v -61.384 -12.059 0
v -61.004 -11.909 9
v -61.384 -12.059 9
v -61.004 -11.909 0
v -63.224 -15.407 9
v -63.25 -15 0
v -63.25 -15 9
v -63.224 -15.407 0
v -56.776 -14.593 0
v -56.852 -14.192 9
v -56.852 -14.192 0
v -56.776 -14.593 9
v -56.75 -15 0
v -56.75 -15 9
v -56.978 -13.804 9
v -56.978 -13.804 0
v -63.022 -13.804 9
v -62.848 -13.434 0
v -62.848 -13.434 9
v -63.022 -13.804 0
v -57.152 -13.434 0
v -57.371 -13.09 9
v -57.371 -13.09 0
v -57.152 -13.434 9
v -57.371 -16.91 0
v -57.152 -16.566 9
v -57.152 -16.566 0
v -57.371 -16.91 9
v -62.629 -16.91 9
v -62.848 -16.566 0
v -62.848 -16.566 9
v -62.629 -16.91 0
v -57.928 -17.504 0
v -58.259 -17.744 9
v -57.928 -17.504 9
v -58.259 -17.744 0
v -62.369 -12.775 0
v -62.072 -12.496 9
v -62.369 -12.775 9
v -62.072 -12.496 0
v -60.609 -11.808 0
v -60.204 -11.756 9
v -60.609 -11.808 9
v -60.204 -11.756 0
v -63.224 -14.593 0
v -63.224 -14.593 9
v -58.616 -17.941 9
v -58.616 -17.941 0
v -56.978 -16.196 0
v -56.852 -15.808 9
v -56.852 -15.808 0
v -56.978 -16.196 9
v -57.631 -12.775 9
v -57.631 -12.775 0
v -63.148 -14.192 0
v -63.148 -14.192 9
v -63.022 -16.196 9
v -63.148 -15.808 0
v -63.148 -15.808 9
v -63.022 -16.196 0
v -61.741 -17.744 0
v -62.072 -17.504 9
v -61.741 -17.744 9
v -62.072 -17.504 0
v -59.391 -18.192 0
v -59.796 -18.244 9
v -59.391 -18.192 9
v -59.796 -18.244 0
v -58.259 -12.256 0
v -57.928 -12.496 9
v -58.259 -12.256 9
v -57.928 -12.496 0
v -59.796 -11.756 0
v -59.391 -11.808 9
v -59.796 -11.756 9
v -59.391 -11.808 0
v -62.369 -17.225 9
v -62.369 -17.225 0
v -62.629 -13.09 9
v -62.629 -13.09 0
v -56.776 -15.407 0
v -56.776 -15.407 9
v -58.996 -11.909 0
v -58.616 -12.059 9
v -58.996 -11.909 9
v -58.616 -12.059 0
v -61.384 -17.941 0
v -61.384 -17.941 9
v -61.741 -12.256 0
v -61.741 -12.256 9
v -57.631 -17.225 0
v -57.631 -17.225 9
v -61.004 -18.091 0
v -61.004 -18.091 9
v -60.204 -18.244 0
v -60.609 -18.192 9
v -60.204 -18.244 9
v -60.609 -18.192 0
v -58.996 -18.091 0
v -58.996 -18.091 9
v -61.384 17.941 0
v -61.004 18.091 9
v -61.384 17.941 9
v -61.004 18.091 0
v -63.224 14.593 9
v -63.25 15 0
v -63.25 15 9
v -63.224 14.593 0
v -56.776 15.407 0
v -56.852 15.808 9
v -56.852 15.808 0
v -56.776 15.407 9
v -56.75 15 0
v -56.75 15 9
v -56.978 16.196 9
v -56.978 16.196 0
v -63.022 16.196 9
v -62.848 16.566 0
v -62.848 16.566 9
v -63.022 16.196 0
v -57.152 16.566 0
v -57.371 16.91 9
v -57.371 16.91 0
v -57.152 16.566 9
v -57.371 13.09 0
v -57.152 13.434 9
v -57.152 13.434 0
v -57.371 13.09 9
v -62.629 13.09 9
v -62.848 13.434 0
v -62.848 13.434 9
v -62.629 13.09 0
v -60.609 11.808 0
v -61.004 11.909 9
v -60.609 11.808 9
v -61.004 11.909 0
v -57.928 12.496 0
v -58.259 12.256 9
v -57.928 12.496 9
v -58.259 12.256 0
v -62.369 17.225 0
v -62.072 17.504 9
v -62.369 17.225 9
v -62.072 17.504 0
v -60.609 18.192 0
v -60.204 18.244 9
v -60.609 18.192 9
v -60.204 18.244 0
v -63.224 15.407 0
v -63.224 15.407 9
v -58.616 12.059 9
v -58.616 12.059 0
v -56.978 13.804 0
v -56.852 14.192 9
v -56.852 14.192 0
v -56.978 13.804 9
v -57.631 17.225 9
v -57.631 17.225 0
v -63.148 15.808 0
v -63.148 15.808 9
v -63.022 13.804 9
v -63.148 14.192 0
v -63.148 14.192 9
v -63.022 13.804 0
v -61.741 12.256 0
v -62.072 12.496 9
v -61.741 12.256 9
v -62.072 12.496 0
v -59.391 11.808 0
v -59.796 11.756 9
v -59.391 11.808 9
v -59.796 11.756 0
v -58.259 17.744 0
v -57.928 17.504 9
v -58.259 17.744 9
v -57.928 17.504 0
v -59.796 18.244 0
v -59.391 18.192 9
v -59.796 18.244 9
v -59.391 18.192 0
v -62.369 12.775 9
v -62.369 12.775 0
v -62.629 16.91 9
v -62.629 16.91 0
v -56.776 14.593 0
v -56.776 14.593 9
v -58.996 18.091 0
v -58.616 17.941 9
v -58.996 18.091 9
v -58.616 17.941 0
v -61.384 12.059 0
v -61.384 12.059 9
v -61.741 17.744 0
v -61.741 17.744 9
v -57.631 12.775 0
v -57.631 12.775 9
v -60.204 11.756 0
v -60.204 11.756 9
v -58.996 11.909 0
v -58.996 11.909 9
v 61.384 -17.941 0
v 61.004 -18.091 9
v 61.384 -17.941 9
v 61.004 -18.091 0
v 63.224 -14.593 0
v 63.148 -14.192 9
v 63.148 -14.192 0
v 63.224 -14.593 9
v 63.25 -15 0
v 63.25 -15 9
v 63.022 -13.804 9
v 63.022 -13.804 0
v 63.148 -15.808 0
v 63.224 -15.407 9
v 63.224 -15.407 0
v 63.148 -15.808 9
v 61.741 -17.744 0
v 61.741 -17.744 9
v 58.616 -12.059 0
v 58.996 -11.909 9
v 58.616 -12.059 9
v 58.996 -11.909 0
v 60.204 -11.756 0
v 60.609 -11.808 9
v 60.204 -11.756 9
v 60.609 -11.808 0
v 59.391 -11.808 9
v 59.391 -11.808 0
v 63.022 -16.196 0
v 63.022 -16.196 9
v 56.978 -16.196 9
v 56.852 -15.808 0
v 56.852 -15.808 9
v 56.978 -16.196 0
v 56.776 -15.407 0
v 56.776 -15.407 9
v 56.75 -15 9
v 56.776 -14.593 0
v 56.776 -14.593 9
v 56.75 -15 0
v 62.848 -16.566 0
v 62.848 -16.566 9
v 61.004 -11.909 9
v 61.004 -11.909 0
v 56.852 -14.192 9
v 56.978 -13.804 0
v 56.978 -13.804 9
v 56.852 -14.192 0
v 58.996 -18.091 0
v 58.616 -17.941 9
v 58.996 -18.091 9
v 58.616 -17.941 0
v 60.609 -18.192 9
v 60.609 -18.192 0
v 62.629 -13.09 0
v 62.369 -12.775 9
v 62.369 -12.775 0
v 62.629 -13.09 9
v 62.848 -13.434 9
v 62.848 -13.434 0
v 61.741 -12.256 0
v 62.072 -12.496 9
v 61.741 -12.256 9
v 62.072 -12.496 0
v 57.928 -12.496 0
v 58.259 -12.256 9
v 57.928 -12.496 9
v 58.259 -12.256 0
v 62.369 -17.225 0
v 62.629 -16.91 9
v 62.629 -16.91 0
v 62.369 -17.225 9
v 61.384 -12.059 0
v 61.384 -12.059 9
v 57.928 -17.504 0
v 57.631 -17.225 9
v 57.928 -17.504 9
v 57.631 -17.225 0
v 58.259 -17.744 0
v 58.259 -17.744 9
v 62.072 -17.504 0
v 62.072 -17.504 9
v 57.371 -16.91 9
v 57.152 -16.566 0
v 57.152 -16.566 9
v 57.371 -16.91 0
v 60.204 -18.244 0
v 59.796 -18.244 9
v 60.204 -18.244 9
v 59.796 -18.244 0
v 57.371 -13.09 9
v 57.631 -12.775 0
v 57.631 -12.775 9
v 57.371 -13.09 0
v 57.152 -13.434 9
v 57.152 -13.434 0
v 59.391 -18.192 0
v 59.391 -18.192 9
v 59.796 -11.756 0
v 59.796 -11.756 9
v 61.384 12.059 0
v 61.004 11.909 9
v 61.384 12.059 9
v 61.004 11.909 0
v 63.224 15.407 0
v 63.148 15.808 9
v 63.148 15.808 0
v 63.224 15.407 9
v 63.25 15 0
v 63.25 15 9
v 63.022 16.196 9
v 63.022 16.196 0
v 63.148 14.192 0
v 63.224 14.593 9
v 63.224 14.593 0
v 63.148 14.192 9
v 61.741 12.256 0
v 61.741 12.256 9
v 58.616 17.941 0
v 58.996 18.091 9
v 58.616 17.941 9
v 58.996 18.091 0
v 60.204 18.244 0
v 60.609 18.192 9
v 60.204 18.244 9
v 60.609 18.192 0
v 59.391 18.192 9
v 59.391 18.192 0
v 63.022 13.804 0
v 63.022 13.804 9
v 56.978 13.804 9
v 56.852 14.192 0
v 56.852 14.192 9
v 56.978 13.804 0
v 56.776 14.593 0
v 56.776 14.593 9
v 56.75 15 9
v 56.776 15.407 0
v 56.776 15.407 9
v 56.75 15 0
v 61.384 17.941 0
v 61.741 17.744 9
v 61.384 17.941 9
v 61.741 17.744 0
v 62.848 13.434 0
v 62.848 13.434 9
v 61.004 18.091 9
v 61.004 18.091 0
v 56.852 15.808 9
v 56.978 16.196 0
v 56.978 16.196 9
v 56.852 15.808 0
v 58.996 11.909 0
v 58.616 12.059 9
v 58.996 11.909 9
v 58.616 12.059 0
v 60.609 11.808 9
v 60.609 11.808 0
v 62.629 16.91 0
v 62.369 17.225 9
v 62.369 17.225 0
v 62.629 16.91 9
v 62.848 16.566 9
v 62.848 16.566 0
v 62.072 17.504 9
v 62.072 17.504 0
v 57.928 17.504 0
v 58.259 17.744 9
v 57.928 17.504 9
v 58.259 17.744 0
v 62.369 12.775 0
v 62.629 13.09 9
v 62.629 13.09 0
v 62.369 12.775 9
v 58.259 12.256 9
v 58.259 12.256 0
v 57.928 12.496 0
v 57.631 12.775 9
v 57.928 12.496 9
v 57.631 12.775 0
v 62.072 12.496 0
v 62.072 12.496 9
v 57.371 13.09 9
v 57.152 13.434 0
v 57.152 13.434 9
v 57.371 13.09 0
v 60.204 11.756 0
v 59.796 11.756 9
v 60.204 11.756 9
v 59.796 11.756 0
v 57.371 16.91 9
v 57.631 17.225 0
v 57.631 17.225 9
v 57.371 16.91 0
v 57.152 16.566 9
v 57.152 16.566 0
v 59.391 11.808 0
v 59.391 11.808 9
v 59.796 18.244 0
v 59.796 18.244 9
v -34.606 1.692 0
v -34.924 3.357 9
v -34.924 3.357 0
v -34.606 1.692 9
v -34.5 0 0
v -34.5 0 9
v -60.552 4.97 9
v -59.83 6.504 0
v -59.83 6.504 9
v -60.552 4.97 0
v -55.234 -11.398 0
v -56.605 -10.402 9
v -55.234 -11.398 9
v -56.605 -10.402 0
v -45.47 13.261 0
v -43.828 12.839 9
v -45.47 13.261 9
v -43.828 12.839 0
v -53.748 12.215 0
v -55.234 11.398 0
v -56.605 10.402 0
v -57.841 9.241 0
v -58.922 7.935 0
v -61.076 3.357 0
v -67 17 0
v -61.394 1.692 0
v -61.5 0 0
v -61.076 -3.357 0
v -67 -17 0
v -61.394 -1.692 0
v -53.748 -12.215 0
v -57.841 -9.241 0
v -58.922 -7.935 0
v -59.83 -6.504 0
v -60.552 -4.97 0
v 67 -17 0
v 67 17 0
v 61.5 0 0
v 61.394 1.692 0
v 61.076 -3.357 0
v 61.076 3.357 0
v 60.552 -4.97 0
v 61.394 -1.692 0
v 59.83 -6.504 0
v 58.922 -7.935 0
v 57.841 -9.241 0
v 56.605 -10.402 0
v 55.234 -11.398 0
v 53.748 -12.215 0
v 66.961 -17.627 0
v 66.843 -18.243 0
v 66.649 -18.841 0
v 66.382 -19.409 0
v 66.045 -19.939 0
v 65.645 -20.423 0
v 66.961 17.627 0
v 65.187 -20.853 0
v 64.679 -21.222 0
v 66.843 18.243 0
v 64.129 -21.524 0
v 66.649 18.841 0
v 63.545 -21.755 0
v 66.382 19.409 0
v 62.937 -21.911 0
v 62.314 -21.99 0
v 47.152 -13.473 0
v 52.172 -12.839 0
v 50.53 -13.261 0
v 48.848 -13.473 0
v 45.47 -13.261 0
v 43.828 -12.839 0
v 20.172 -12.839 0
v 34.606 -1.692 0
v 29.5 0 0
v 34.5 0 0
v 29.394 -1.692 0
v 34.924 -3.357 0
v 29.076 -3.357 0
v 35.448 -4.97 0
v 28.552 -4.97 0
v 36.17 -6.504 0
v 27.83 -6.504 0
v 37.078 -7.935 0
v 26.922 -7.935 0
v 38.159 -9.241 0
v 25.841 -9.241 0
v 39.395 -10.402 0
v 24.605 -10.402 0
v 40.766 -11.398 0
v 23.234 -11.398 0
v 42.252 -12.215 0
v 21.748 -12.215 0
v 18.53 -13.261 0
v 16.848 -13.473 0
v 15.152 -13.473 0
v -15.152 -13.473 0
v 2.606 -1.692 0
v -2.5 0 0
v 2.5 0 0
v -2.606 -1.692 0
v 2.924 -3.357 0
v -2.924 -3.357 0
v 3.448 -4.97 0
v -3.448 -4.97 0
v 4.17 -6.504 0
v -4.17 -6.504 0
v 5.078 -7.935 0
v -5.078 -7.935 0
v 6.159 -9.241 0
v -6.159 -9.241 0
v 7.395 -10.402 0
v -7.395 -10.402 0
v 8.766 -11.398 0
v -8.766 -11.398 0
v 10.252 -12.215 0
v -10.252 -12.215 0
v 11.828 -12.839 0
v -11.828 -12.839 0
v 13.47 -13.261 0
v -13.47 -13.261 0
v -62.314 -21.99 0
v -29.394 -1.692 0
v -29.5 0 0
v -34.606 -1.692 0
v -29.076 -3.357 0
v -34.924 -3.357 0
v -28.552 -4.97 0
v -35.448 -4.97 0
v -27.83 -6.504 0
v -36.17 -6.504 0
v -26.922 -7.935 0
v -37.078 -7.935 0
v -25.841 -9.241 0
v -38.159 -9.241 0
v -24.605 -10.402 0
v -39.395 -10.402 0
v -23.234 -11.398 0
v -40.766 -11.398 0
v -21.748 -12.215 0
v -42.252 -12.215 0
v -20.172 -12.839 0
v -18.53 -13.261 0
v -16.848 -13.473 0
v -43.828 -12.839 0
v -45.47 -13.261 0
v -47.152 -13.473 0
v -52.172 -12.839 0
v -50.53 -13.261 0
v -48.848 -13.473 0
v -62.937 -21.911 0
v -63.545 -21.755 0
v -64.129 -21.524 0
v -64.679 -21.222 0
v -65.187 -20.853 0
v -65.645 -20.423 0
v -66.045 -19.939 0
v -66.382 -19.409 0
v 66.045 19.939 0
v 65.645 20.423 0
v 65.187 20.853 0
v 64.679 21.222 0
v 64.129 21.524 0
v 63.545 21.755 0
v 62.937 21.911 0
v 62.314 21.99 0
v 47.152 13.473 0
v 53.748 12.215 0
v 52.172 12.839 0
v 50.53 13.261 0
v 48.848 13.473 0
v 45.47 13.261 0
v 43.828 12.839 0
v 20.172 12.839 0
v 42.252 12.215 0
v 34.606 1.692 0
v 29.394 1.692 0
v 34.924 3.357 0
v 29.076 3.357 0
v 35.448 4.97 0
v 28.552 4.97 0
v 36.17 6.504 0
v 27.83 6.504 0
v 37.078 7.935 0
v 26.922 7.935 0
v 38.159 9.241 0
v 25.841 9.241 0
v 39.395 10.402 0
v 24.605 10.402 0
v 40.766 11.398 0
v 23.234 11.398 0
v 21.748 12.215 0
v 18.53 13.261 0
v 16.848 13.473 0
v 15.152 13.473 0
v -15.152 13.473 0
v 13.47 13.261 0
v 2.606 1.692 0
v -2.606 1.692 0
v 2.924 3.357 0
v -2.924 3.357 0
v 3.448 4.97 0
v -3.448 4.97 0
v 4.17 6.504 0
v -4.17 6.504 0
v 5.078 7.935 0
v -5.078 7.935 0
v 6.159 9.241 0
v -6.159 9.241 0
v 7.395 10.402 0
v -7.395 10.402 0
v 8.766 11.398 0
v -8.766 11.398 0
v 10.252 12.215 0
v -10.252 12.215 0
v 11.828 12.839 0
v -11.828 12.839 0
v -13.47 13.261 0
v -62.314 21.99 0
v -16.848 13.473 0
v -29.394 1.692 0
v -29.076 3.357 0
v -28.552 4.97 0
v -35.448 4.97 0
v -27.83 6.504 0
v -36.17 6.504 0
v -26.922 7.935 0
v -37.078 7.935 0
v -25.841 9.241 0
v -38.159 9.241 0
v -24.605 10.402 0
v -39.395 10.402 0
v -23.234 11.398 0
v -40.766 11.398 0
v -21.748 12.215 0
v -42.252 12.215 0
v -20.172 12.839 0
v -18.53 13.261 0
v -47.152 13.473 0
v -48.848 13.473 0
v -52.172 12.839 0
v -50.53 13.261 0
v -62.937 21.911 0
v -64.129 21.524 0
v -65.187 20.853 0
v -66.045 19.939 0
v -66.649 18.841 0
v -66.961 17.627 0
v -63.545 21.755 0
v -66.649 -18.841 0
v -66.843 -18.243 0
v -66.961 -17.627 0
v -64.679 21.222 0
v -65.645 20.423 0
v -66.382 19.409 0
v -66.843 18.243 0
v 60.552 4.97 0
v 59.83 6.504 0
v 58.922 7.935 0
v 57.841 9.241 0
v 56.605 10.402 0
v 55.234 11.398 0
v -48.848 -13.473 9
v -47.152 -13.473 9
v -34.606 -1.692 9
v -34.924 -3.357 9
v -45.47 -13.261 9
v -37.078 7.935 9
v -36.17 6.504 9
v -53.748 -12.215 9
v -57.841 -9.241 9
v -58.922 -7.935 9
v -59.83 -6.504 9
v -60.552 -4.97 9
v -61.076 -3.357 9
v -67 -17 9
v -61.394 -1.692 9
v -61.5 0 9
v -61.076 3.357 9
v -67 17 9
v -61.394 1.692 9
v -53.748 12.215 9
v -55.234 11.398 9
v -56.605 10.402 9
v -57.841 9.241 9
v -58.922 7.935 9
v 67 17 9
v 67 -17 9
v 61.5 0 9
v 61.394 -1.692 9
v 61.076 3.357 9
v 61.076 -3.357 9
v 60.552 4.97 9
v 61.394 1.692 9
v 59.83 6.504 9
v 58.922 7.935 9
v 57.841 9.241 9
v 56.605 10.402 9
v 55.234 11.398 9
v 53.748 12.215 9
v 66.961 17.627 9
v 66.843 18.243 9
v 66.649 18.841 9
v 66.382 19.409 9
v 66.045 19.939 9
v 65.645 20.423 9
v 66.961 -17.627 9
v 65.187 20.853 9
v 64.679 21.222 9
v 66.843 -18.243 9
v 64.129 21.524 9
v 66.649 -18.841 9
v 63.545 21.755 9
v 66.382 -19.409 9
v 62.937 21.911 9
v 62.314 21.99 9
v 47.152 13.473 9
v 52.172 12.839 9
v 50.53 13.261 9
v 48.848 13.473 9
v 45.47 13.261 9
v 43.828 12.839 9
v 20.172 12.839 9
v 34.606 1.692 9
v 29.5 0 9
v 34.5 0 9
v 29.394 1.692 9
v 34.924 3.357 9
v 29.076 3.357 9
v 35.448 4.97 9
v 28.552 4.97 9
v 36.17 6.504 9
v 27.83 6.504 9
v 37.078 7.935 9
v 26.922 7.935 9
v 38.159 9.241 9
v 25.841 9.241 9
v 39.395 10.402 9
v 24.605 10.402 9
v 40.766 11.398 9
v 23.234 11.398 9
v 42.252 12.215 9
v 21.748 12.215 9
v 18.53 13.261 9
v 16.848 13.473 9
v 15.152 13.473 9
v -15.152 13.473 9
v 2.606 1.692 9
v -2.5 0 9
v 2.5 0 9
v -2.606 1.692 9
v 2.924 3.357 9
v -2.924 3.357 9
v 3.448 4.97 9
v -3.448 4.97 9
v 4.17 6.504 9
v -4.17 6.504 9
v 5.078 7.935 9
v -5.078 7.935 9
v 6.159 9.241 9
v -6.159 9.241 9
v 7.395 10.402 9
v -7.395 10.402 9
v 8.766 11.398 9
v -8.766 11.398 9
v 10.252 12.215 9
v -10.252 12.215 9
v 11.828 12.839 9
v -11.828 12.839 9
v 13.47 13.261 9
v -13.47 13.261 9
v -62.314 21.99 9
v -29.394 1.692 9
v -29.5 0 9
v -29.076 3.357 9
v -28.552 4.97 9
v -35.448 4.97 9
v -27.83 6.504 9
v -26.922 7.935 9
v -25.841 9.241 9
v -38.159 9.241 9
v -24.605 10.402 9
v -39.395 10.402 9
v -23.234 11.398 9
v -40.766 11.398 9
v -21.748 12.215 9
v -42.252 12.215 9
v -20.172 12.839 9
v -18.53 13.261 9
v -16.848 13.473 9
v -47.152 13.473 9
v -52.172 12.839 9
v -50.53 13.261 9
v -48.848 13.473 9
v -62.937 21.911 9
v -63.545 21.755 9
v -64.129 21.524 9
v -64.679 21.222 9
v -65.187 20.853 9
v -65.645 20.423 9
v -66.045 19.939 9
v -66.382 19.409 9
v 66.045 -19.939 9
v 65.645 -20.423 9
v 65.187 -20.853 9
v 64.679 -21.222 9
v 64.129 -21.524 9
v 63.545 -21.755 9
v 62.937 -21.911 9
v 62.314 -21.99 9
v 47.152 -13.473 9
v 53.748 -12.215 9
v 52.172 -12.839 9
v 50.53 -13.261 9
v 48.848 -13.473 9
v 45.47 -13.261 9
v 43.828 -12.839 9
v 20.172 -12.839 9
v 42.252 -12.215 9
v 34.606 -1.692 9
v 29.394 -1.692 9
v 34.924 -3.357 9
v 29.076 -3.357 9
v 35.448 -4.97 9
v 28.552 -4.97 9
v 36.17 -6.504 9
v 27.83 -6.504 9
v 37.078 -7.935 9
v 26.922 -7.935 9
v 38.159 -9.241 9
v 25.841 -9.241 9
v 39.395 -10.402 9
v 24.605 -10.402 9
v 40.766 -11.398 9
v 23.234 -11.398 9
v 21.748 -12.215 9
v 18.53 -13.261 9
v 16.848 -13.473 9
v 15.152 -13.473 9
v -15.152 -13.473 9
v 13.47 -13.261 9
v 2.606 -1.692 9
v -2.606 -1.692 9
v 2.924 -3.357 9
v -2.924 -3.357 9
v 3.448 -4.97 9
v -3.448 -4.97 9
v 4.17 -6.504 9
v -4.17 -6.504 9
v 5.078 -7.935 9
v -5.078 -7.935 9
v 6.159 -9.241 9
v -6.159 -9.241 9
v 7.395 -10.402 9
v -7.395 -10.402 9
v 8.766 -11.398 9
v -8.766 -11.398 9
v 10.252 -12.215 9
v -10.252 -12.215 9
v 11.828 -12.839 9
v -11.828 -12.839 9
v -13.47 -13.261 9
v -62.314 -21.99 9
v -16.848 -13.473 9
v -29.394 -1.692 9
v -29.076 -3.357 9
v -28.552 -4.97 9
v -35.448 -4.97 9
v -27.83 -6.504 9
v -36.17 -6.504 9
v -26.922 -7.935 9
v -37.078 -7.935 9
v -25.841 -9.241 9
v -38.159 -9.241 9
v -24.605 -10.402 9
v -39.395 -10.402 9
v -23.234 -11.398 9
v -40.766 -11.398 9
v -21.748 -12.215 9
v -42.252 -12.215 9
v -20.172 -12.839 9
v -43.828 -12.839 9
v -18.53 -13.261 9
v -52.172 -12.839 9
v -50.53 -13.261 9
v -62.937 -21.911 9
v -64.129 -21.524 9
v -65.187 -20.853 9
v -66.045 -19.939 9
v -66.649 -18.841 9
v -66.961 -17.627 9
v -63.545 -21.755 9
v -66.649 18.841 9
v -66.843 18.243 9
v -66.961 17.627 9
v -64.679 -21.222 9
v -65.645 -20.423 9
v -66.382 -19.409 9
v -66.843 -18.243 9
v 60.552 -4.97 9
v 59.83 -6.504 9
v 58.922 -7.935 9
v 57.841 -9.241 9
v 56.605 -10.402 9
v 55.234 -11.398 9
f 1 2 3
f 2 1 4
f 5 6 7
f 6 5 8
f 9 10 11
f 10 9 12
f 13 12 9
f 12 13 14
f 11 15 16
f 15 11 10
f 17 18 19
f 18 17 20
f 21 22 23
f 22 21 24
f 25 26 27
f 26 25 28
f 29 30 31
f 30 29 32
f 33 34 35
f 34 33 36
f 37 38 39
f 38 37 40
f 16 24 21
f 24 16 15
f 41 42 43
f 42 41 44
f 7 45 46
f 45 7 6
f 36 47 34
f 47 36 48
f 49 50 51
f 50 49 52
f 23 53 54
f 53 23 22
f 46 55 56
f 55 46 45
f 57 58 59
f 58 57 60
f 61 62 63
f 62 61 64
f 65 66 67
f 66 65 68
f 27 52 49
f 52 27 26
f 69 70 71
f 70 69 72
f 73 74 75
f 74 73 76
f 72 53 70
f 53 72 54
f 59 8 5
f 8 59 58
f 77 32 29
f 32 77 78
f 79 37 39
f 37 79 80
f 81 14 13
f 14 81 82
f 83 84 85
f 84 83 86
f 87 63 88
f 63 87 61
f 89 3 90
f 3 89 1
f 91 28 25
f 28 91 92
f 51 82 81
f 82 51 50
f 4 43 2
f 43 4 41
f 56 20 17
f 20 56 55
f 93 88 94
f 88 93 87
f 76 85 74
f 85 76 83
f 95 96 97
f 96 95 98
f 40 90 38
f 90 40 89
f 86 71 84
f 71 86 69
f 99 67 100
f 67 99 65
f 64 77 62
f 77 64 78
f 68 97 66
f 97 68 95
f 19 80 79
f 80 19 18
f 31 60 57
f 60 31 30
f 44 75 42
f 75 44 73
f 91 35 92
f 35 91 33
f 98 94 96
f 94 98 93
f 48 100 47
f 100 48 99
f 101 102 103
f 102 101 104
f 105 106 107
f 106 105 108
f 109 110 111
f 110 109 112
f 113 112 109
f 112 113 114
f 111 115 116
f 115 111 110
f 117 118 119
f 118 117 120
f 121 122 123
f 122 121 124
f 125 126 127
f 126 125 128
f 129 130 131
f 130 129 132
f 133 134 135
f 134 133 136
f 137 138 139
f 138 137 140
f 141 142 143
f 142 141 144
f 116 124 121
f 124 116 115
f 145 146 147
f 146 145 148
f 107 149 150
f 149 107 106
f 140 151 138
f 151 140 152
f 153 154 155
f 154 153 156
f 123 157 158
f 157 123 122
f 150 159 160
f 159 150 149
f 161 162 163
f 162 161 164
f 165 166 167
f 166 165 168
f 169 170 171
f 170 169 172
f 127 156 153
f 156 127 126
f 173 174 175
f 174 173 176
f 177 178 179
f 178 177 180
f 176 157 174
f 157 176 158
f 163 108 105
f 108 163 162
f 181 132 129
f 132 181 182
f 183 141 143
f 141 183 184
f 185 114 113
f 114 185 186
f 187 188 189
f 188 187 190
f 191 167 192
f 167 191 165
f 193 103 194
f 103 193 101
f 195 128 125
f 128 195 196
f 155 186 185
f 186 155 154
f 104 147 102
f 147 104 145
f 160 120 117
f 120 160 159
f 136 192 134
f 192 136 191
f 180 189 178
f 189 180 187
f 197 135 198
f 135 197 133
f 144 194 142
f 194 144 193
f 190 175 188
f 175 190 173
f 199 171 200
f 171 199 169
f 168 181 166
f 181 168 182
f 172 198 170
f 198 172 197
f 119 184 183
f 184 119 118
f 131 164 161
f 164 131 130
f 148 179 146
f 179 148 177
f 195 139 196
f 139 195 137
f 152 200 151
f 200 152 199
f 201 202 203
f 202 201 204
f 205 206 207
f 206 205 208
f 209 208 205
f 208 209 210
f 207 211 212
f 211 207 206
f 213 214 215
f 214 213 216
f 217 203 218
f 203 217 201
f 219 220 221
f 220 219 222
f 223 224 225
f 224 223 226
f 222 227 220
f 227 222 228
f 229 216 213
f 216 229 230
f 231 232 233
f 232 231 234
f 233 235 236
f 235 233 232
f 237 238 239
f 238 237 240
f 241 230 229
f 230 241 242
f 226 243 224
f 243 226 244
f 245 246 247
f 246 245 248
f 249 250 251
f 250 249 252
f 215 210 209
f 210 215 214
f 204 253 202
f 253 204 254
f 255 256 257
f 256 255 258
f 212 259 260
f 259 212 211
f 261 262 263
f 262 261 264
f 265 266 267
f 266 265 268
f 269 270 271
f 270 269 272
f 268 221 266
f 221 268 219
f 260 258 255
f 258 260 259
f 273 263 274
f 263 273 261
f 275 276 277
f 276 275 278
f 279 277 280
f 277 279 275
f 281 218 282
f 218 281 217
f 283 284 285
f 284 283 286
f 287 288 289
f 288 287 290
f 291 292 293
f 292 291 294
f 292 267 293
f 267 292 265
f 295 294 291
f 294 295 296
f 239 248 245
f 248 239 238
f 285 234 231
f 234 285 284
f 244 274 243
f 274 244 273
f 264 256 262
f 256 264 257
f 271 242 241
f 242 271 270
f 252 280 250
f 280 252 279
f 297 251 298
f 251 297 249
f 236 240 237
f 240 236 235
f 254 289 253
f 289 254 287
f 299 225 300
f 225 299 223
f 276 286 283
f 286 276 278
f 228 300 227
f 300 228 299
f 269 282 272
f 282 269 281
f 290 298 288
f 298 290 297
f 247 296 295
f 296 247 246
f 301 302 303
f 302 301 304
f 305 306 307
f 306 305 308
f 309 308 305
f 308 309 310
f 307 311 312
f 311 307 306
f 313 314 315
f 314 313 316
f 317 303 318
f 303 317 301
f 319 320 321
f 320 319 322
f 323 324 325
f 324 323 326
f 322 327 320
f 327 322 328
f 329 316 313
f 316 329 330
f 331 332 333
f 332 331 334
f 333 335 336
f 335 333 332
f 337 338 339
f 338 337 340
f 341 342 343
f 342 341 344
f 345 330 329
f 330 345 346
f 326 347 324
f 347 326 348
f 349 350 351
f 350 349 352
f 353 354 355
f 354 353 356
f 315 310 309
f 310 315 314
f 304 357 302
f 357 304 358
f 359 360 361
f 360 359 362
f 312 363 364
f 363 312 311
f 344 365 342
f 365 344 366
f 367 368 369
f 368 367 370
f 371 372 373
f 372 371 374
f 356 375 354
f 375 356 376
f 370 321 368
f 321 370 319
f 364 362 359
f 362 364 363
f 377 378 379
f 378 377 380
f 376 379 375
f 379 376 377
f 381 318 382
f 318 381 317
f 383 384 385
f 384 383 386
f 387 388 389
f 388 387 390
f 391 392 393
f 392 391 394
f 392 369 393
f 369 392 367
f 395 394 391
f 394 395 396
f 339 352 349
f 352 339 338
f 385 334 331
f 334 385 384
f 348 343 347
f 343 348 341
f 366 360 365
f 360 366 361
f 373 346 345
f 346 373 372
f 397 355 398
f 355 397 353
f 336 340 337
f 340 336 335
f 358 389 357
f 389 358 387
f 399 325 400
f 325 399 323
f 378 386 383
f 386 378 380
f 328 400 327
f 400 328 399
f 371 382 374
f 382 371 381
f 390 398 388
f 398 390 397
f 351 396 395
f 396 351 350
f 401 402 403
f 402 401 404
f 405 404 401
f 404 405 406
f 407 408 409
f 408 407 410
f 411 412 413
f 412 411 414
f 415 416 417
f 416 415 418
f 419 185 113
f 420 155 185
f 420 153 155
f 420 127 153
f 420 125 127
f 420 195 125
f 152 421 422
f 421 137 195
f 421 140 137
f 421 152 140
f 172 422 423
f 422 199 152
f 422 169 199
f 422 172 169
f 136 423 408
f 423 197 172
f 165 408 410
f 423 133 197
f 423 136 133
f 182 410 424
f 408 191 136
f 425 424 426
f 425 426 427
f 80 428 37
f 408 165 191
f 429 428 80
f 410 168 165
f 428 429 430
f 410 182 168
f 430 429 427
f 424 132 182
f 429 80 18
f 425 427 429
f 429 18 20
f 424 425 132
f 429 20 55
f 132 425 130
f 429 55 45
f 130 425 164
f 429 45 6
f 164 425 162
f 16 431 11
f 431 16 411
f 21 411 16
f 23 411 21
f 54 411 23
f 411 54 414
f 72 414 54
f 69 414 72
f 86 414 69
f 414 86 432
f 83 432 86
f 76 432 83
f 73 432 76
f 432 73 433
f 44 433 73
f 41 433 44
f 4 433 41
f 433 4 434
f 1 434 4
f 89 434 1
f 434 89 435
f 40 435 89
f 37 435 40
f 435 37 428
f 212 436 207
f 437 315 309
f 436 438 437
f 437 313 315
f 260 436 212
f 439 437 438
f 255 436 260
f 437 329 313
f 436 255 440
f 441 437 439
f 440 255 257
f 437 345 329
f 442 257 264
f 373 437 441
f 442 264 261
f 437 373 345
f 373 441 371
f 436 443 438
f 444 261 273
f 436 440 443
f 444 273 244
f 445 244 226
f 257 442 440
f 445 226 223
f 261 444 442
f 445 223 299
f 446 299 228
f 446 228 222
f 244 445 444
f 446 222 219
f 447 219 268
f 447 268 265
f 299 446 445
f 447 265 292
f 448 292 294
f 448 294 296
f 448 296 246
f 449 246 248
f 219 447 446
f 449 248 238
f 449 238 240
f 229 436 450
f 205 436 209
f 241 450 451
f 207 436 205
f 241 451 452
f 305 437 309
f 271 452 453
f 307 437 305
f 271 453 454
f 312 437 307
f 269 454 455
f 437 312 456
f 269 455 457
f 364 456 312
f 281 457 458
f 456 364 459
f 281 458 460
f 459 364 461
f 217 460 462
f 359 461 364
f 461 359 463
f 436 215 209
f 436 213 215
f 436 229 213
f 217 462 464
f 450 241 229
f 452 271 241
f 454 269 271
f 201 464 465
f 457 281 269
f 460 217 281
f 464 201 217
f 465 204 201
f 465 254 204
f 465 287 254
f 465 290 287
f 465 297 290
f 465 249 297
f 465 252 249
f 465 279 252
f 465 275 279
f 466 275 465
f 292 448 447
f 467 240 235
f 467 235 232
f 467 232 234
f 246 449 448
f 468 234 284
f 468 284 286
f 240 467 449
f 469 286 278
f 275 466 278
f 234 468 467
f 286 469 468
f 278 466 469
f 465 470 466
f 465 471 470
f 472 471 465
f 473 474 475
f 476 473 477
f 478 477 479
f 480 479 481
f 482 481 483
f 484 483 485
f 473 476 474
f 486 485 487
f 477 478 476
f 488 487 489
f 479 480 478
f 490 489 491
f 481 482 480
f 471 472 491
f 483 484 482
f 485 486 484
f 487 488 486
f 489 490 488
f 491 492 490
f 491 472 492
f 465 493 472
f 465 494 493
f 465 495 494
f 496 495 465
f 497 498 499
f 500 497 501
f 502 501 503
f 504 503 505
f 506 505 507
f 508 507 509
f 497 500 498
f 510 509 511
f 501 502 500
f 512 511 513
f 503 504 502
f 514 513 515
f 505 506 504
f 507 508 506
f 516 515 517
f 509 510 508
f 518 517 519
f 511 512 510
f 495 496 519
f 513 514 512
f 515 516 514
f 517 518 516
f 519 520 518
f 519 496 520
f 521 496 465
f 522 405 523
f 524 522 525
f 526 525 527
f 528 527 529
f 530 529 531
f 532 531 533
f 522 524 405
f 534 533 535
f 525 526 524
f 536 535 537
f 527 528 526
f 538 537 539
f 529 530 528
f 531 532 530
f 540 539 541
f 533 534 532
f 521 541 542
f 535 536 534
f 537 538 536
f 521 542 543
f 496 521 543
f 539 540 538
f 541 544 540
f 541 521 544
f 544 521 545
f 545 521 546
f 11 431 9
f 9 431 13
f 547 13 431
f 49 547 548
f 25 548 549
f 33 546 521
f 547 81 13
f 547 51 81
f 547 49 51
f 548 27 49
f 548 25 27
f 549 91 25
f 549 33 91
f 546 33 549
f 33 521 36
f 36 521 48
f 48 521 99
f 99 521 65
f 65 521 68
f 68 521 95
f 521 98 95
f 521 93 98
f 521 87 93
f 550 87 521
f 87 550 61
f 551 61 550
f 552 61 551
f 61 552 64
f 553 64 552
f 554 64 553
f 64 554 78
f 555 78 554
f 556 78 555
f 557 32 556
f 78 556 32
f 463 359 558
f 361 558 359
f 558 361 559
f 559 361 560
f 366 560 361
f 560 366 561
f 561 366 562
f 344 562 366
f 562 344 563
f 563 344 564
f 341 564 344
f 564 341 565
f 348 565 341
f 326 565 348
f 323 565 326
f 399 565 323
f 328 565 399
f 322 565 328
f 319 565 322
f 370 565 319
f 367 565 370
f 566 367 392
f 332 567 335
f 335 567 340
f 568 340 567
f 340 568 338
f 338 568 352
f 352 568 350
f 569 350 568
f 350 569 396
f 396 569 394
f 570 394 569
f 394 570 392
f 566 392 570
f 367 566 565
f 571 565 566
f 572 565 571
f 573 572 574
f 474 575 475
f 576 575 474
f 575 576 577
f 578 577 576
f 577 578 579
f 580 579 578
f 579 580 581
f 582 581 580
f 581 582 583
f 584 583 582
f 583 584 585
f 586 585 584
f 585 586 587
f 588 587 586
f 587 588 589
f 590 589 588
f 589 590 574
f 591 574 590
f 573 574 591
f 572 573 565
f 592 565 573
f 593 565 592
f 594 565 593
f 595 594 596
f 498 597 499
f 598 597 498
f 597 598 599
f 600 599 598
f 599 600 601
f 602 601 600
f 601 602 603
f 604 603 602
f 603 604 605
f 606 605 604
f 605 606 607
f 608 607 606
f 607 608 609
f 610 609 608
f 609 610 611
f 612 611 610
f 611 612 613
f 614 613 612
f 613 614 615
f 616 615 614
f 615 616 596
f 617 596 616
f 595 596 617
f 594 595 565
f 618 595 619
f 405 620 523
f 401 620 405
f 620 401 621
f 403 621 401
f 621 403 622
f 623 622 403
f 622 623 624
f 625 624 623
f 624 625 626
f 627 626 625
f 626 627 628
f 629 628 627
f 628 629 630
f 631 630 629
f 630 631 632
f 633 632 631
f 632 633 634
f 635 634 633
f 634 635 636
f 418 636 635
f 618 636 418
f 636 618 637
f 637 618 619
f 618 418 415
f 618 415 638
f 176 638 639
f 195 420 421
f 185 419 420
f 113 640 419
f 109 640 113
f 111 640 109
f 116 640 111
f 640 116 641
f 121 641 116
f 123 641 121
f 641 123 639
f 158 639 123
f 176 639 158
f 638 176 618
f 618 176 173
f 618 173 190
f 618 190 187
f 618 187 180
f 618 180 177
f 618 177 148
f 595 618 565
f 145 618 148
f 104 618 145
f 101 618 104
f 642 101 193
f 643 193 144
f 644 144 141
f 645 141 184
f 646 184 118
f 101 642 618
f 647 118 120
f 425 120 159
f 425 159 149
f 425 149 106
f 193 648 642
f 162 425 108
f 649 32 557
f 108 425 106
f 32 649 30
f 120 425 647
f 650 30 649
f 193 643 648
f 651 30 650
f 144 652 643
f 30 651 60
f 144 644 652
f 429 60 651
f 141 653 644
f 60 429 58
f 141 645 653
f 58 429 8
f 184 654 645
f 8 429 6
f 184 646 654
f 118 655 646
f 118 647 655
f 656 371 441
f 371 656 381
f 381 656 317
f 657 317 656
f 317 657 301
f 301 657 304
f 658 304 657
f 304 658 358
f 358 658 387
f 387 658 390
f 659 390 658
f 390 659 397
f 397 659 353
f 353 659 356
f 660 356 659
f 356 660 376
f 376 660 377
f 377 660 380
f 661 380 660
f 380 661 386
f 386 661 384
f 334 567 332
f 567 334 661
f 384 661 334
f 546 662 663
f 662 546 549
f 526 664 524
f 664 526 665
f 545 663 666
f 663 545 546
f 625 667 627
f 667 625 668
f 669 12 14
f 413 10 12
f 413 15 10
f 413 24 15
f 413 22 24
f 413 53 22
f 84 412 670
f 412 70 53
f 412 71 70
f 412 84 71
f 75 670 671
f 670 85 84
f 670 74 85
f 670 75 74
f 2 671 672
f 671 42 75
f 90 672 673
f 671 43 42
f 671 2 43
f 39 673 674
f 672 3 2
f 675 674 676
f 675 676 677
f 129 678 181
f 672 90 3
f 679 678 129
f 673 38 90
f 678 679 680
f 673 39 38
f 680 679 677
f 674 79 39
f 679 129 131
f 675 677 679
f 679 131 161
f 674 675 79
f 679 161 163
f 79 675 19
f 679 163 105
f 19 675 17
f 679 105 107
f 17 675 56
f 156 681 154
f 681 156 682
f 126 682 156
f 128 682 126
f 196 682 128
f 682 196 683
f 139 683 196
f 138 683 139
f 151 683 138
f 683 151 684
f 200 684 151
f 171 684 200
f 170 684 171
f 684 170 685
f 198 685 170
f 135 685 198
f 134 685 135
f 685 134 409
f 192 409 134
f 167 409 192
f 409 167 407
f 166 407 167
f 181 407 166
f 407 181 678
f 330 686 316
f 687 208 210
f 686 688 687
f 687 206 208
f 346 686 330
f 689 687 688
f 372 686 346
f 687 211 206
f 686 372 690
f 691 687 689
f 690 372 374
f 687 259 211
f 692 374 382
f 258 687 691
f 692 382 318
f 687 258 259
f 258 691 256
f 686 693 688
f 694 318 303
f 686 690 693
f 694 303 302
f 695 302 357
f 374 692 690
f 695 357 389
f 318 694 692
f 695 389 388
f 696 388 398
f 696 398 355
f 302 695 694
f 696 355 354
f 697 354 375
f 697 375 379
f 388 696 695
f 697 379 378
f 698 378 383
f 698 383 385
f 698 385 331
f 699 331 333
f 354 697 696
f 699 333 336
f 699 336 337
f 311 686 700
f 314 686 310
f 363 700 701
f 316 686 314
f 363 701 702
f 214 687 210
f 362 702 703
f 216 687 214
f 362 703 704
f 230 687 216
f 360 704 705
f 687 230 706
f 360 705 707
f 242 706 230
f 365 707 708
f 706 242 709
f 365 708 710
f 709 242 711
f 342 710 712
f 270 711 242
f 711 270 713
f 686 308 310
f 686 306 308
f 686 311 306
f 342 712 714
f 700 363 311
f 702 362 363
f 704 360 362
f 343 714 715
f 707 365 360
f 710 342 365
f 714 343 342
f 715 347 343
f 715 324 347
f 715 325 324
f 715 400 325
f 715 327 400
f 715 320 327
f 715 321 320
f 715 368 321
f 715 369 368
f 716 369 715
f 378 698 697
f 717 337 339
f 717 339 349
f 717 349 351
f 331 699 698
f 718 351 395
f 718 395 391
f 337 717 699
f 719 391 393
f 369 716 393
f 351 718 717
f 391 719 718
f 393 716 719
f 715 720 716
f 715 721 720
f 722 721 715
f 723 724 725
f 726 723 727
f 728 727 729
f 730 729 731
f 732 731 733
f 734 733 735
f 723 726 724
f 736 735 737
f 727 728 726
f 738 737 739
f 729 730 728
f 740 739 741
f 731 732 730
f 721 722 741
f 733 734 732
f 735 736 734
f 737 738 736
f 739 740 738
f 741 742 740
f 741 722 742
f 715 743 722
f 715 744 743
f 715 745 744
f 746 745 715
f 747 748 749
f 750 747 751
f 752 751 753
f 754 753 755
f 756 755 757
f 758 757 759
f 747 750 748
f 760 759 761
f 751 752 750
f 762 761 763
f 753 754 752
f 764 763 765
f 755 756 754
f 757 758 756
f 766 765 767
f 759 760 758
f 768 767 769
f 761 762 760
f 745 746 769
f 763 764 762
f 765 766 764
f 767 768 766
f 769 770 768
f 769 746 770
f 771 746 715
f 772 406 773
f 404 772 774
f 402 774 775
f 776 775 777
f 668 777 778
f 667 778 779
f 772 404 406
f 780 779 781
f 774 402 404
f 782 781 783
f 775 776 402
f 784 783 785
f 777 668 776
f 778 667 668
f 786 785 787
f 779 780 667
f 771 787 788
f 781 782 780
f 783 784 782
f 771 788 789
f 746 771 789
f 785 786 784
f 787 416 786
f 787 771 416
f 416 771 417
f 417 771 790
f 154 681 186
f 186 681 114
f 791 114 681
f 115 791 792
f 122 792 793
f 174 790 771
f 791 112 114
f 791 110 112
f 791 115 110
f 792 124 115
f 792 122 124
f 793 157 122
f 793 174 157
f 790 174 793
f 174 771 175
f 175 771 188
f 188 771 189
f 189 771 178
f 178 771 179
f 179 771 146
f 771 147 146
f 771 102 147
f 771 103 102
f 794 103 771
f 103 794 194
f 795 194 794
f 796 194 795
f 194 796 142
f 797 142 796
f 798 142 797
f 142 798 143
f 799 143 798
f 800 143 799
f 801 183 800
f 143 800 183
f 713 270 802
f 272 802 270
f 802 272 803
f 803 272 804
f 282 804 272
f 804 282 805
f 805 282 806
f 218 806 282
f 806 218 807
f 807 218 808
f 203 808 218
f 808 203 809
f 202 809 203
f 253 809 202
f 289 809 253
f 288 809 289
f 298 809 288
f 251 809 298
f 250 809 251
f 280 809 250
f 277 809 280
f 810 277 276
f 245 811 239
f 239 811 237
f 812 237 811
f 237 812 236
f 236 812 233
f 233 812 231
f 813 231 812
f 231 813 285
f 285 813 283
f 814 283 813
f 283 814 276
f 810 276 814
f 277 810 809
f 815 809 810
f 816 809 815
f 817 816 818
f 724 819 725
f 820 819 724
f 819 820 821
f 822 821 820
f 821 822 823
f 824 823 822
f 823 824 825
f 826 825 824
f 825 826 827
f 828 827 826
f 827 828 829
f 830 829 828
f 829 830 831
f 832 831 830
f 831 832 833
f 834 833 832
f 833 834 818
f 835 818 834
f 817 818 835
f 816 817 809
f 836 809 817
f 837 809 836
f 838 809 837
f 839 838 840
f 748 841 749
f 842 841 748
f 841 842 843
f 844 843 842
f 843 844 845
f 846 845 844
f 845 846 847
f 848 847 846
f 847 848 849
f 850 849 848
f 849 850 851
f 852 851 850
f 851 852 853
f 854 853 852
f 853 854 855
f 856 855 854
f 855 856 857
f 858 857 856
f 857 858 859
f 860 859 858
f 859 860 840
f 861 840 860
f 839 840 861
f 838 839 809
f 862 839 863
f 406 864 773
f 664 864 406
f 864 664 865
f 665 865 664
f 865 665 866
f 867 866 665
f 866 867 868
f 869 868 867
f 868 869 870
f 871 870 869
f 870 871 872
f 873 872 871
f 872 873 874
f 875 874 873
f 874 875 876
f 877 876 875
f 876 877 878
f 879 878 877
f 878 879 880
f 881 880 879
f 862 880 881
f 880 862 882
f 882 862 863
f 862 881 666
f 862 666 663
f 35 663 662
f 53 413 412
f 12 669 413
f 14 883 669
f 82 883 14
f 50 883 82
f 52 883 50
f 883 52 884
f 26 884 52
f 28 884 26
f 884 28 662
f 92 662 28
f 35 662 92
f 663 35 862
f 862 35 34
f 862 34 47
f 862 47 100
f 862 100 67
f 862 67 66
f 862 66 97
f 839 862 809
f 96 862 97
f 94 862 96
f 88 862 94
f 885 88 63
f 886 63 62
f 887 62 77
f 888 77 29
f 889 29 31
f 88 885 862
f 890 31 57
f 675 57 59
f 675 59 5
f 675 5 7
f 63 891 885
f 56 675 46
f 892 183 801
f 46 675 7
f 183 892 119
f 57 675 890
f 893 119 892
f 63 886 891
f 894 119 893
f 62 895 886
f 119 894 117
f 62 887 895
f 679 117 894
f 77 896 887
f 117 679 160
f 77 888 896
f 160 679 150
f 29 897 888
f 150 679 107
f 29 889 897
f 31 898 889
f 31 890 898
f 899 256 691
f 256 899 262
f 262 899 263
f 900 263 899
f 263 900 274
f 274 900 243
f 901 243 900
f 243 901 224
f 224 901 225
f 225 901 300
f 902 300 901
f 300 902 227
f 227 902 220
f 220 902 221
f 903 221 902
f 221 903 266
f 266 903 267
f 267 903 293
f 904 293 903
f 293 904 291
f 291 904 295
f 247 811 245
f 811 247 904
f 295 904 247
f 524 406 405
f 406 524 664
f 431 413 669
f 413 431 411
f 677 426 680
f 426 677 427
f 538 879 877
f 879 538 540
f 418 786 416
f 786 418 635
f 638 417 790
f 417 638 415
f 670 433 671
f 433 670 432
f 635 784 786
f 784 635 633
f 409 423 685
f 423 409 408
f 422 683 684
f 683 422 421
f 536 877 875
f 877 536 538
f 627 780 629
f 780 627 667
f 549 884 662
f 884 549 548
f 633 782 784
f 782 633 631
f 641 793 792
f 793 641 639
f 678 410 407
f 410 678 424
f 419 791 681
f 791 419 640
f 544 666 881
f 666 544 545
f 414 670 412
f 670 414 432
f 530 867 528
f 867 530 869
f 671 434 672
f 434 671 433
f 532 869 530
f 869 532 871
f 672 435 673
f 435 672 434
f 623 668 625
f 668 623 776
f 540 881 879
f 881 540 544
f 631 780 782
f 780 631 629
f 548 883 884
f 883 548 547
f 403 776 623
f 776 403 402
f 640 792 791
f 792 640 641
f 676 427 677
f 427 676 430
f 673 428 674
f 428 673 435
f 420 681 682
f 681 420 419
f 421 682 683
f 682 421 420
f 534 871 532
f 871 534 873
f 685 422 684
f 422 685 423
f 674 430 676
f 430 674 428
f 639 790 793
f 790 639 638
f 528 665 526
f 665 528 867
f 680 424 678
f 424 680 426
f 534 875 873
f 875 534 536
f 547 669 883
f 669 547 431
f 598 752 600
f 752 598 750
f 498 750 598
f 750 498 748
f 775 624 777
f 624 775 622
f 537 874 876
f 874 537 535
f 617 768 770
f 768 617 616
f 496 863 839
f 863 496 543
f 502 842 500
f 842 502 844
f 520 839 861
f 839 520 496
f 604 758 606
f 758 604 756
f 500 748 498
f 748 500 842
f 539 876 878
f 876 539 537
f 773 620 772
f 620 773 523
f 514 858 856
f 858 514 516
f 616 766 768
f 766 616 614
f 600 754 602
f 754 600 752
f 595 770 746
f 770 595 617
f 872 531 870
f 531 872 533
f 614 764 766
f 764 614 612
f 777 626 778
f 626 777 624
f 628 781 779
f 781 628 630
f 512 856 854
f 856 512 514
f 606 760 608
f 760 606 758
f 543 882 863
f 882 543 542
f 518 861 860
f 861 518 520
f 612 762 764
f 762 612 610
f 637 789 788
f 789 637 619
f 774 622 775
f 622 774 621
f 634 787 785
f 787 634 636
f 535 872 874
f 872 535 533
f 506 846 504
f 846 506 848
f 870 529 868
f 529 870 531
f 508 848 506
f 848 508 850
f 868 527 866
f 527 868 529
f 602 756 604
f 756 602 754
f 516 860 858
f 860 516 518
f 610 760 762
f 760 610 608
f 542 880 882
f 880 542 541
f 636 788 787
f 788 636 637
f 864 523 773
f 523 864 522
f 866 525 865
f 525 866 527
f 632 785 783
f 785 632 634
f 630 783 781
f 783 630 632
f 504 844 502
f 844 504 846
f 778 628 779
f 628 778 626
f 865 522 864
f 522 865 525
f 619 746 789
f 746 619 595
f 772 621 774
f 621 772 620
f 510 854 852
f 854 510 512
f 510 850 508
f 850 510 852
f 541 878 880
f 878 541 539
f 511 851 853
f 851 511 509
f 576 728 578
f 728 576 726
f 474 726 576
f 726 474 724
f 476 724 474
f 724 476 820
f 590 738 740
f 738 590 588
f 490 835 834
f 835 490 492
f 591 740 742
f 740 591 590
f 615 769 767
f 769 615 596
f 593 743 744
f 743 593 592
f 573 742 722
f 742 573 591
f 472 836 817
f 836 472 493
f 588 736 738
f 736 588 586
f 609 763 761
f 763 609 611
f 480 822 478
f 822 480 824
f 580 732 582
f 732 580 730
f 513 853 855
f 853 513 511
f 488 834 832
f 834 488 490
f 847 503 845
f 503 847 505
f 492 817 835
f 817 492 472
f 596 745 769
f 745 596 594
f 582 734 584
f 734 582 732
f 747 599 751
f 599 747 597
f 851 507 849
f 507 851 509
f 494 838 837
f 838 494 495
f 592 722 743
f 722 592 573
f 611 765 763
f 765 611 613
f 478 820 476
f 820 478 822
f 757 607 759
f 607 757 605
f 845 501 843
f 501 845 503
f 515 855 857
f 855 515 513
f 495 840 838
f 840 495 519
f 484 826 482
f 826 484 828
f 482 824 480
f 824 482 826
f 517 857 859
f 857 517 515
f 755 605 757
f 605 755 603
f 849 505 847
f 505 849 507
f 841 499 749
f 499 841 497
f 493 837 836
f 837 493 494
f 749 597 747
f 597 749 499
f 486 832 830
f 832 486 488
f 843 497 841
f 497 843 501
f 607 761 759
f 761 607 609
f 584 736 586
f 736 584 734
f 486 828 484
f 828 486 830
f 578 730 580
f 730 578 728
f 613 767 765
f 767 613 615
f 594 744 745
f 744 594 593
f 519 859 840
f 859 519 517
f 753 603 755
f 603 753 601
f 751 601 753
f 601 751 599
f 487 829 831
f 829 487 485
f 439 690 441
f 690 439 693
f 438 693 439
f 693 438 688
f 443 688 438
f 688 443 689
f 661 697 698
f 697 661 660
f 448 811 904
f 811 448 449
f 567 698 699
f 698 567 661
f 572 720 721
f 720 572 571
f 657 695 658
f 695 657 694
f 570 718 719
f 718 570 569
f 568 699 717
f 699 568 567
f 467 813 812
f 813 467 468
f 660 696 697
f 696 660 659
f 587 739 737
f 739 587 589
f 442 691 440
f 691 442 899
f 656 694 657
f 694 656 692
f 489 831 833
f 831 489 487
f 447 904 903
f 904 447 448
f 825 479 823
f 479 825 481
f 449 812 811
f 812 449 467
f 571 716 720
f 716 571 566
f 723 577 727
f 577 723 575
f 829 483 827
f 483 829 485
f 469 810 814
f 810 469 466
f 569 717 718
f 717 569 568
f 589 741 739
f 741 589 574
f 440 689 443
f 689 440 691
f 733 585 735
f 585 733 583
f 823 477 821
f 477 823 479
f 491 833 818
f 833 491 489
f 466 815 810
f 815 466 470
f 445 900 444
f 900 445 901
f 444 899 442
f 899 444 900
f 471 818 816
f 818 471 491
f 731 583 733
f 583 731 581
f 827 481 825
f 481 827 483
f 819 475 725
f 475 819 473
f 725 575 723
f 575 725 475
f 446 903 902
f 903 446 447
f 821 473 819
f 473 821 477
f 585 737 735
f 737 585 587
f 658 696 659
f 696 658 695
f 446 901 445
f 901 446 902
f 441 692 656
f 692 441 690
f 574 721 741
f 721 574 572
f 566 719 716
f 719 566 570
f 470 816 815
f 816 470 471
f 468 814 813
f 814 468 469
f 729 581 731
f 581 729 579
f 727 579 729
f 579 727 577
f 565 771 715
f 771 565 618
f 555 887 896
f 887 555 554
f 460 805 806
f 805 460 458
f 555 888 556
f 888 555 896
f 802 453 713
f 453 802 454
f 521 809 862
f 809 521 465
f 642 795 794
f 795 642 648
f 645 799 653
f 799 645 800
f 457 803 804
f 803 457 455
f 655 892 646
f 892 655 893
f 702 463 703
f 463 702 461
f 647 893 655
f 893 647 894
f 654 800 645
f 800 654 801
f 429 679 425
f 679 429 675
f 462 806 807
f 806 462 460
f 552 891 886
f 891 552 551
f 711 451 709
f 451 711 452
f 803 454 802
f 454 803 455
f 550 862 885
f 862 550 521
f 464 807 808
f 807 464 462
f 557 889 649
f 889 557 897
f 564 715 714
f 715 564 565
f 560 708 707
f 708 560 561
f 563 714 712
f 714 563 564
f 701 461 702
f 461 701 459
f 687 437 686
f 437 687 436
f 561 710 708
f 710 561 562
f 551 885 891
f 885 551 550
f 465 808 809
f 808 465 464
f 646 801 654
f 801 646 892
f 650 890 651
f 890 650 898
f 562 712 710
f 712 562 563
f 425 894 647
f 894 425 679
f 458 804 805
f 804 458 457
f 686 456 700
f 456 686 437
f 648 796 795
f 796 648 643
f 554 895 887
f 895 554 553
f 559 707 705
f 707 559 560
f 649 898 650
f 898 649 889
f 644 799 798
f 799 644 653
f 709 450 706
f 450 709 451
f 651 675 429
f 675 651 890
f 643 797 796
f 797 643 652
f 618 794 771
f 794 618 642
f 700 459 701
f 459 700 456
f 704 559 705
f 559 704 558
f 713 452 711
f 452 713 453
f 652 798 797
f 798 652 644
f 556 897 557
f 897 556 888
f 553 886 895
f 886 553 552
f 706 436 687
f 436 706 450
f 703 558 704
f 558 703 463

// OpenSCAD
$fn = 50;

difference() {
	union() {
		hull() {
			translate(v = [-62.0, 17.0, 0]) {
				cylinder(h = 9, r = 5);
			}
			translate(v = [62.0, 17.0, 0]) {
				cylinder(h = 9, r = 5);
			}
			translate(v = [-62.0, -17.0, 0]) {
				cylinder(h = 9, r = 5);
			}
			translate(v = [62.0, -17.0, 0]) {
				cylinder(h = 9, r = 5);
			}
		}
	}
	union() {
		translate(v = [-60.0, -15.0, -100.0]) {
			cylinder(h = 200, r = 3.25);
		}
		translate(v = [-60.0, 15.0, -100.0]) {
			cylinder(h = 200, r = 3.25);
		}
		translate(v = [60.0, -15.0, -100.0]) {
			cylinder(h = 200, r = 3.25);
		}
		translate(v = [60.0, 15.0, -100.0]) {
			cylinder(h = 200, r = 3.25);
		}
		translate(v = [-60.0, -15.0, -100.0]) {
			cylinder(h = 200, r = 1.8);
		}
		translate(v = [-60.0, 15.0, -100.0]) {
			cylinder(h = 200, r = 1.8);
		}
		translate(v = [60.0, -15.0, -100.0]) {
			cylinder(h = 200, r = 1.8);
		}
		translate(v = [60.0, 15.0, -100.0]) {
			cylinder(h = 200, r = 1.8);
		}
		translate(v = [-48.0, 0, 0.0]) {
			cylinder(h = 9, r = 13.5);
		}
		translate(v = [-16.0, 0, 0.0]) {
			cylinder(h = 9, r = 13.5);
		}
		translate(v = [16.0, 0, 0.0]) {
			cylinder(h = 9, r = 13.5);
		}
		translate(v = [48.0, 0, 0.0]) {
			cylinder(h = 9, r = 13.5);
		}
	}
}
